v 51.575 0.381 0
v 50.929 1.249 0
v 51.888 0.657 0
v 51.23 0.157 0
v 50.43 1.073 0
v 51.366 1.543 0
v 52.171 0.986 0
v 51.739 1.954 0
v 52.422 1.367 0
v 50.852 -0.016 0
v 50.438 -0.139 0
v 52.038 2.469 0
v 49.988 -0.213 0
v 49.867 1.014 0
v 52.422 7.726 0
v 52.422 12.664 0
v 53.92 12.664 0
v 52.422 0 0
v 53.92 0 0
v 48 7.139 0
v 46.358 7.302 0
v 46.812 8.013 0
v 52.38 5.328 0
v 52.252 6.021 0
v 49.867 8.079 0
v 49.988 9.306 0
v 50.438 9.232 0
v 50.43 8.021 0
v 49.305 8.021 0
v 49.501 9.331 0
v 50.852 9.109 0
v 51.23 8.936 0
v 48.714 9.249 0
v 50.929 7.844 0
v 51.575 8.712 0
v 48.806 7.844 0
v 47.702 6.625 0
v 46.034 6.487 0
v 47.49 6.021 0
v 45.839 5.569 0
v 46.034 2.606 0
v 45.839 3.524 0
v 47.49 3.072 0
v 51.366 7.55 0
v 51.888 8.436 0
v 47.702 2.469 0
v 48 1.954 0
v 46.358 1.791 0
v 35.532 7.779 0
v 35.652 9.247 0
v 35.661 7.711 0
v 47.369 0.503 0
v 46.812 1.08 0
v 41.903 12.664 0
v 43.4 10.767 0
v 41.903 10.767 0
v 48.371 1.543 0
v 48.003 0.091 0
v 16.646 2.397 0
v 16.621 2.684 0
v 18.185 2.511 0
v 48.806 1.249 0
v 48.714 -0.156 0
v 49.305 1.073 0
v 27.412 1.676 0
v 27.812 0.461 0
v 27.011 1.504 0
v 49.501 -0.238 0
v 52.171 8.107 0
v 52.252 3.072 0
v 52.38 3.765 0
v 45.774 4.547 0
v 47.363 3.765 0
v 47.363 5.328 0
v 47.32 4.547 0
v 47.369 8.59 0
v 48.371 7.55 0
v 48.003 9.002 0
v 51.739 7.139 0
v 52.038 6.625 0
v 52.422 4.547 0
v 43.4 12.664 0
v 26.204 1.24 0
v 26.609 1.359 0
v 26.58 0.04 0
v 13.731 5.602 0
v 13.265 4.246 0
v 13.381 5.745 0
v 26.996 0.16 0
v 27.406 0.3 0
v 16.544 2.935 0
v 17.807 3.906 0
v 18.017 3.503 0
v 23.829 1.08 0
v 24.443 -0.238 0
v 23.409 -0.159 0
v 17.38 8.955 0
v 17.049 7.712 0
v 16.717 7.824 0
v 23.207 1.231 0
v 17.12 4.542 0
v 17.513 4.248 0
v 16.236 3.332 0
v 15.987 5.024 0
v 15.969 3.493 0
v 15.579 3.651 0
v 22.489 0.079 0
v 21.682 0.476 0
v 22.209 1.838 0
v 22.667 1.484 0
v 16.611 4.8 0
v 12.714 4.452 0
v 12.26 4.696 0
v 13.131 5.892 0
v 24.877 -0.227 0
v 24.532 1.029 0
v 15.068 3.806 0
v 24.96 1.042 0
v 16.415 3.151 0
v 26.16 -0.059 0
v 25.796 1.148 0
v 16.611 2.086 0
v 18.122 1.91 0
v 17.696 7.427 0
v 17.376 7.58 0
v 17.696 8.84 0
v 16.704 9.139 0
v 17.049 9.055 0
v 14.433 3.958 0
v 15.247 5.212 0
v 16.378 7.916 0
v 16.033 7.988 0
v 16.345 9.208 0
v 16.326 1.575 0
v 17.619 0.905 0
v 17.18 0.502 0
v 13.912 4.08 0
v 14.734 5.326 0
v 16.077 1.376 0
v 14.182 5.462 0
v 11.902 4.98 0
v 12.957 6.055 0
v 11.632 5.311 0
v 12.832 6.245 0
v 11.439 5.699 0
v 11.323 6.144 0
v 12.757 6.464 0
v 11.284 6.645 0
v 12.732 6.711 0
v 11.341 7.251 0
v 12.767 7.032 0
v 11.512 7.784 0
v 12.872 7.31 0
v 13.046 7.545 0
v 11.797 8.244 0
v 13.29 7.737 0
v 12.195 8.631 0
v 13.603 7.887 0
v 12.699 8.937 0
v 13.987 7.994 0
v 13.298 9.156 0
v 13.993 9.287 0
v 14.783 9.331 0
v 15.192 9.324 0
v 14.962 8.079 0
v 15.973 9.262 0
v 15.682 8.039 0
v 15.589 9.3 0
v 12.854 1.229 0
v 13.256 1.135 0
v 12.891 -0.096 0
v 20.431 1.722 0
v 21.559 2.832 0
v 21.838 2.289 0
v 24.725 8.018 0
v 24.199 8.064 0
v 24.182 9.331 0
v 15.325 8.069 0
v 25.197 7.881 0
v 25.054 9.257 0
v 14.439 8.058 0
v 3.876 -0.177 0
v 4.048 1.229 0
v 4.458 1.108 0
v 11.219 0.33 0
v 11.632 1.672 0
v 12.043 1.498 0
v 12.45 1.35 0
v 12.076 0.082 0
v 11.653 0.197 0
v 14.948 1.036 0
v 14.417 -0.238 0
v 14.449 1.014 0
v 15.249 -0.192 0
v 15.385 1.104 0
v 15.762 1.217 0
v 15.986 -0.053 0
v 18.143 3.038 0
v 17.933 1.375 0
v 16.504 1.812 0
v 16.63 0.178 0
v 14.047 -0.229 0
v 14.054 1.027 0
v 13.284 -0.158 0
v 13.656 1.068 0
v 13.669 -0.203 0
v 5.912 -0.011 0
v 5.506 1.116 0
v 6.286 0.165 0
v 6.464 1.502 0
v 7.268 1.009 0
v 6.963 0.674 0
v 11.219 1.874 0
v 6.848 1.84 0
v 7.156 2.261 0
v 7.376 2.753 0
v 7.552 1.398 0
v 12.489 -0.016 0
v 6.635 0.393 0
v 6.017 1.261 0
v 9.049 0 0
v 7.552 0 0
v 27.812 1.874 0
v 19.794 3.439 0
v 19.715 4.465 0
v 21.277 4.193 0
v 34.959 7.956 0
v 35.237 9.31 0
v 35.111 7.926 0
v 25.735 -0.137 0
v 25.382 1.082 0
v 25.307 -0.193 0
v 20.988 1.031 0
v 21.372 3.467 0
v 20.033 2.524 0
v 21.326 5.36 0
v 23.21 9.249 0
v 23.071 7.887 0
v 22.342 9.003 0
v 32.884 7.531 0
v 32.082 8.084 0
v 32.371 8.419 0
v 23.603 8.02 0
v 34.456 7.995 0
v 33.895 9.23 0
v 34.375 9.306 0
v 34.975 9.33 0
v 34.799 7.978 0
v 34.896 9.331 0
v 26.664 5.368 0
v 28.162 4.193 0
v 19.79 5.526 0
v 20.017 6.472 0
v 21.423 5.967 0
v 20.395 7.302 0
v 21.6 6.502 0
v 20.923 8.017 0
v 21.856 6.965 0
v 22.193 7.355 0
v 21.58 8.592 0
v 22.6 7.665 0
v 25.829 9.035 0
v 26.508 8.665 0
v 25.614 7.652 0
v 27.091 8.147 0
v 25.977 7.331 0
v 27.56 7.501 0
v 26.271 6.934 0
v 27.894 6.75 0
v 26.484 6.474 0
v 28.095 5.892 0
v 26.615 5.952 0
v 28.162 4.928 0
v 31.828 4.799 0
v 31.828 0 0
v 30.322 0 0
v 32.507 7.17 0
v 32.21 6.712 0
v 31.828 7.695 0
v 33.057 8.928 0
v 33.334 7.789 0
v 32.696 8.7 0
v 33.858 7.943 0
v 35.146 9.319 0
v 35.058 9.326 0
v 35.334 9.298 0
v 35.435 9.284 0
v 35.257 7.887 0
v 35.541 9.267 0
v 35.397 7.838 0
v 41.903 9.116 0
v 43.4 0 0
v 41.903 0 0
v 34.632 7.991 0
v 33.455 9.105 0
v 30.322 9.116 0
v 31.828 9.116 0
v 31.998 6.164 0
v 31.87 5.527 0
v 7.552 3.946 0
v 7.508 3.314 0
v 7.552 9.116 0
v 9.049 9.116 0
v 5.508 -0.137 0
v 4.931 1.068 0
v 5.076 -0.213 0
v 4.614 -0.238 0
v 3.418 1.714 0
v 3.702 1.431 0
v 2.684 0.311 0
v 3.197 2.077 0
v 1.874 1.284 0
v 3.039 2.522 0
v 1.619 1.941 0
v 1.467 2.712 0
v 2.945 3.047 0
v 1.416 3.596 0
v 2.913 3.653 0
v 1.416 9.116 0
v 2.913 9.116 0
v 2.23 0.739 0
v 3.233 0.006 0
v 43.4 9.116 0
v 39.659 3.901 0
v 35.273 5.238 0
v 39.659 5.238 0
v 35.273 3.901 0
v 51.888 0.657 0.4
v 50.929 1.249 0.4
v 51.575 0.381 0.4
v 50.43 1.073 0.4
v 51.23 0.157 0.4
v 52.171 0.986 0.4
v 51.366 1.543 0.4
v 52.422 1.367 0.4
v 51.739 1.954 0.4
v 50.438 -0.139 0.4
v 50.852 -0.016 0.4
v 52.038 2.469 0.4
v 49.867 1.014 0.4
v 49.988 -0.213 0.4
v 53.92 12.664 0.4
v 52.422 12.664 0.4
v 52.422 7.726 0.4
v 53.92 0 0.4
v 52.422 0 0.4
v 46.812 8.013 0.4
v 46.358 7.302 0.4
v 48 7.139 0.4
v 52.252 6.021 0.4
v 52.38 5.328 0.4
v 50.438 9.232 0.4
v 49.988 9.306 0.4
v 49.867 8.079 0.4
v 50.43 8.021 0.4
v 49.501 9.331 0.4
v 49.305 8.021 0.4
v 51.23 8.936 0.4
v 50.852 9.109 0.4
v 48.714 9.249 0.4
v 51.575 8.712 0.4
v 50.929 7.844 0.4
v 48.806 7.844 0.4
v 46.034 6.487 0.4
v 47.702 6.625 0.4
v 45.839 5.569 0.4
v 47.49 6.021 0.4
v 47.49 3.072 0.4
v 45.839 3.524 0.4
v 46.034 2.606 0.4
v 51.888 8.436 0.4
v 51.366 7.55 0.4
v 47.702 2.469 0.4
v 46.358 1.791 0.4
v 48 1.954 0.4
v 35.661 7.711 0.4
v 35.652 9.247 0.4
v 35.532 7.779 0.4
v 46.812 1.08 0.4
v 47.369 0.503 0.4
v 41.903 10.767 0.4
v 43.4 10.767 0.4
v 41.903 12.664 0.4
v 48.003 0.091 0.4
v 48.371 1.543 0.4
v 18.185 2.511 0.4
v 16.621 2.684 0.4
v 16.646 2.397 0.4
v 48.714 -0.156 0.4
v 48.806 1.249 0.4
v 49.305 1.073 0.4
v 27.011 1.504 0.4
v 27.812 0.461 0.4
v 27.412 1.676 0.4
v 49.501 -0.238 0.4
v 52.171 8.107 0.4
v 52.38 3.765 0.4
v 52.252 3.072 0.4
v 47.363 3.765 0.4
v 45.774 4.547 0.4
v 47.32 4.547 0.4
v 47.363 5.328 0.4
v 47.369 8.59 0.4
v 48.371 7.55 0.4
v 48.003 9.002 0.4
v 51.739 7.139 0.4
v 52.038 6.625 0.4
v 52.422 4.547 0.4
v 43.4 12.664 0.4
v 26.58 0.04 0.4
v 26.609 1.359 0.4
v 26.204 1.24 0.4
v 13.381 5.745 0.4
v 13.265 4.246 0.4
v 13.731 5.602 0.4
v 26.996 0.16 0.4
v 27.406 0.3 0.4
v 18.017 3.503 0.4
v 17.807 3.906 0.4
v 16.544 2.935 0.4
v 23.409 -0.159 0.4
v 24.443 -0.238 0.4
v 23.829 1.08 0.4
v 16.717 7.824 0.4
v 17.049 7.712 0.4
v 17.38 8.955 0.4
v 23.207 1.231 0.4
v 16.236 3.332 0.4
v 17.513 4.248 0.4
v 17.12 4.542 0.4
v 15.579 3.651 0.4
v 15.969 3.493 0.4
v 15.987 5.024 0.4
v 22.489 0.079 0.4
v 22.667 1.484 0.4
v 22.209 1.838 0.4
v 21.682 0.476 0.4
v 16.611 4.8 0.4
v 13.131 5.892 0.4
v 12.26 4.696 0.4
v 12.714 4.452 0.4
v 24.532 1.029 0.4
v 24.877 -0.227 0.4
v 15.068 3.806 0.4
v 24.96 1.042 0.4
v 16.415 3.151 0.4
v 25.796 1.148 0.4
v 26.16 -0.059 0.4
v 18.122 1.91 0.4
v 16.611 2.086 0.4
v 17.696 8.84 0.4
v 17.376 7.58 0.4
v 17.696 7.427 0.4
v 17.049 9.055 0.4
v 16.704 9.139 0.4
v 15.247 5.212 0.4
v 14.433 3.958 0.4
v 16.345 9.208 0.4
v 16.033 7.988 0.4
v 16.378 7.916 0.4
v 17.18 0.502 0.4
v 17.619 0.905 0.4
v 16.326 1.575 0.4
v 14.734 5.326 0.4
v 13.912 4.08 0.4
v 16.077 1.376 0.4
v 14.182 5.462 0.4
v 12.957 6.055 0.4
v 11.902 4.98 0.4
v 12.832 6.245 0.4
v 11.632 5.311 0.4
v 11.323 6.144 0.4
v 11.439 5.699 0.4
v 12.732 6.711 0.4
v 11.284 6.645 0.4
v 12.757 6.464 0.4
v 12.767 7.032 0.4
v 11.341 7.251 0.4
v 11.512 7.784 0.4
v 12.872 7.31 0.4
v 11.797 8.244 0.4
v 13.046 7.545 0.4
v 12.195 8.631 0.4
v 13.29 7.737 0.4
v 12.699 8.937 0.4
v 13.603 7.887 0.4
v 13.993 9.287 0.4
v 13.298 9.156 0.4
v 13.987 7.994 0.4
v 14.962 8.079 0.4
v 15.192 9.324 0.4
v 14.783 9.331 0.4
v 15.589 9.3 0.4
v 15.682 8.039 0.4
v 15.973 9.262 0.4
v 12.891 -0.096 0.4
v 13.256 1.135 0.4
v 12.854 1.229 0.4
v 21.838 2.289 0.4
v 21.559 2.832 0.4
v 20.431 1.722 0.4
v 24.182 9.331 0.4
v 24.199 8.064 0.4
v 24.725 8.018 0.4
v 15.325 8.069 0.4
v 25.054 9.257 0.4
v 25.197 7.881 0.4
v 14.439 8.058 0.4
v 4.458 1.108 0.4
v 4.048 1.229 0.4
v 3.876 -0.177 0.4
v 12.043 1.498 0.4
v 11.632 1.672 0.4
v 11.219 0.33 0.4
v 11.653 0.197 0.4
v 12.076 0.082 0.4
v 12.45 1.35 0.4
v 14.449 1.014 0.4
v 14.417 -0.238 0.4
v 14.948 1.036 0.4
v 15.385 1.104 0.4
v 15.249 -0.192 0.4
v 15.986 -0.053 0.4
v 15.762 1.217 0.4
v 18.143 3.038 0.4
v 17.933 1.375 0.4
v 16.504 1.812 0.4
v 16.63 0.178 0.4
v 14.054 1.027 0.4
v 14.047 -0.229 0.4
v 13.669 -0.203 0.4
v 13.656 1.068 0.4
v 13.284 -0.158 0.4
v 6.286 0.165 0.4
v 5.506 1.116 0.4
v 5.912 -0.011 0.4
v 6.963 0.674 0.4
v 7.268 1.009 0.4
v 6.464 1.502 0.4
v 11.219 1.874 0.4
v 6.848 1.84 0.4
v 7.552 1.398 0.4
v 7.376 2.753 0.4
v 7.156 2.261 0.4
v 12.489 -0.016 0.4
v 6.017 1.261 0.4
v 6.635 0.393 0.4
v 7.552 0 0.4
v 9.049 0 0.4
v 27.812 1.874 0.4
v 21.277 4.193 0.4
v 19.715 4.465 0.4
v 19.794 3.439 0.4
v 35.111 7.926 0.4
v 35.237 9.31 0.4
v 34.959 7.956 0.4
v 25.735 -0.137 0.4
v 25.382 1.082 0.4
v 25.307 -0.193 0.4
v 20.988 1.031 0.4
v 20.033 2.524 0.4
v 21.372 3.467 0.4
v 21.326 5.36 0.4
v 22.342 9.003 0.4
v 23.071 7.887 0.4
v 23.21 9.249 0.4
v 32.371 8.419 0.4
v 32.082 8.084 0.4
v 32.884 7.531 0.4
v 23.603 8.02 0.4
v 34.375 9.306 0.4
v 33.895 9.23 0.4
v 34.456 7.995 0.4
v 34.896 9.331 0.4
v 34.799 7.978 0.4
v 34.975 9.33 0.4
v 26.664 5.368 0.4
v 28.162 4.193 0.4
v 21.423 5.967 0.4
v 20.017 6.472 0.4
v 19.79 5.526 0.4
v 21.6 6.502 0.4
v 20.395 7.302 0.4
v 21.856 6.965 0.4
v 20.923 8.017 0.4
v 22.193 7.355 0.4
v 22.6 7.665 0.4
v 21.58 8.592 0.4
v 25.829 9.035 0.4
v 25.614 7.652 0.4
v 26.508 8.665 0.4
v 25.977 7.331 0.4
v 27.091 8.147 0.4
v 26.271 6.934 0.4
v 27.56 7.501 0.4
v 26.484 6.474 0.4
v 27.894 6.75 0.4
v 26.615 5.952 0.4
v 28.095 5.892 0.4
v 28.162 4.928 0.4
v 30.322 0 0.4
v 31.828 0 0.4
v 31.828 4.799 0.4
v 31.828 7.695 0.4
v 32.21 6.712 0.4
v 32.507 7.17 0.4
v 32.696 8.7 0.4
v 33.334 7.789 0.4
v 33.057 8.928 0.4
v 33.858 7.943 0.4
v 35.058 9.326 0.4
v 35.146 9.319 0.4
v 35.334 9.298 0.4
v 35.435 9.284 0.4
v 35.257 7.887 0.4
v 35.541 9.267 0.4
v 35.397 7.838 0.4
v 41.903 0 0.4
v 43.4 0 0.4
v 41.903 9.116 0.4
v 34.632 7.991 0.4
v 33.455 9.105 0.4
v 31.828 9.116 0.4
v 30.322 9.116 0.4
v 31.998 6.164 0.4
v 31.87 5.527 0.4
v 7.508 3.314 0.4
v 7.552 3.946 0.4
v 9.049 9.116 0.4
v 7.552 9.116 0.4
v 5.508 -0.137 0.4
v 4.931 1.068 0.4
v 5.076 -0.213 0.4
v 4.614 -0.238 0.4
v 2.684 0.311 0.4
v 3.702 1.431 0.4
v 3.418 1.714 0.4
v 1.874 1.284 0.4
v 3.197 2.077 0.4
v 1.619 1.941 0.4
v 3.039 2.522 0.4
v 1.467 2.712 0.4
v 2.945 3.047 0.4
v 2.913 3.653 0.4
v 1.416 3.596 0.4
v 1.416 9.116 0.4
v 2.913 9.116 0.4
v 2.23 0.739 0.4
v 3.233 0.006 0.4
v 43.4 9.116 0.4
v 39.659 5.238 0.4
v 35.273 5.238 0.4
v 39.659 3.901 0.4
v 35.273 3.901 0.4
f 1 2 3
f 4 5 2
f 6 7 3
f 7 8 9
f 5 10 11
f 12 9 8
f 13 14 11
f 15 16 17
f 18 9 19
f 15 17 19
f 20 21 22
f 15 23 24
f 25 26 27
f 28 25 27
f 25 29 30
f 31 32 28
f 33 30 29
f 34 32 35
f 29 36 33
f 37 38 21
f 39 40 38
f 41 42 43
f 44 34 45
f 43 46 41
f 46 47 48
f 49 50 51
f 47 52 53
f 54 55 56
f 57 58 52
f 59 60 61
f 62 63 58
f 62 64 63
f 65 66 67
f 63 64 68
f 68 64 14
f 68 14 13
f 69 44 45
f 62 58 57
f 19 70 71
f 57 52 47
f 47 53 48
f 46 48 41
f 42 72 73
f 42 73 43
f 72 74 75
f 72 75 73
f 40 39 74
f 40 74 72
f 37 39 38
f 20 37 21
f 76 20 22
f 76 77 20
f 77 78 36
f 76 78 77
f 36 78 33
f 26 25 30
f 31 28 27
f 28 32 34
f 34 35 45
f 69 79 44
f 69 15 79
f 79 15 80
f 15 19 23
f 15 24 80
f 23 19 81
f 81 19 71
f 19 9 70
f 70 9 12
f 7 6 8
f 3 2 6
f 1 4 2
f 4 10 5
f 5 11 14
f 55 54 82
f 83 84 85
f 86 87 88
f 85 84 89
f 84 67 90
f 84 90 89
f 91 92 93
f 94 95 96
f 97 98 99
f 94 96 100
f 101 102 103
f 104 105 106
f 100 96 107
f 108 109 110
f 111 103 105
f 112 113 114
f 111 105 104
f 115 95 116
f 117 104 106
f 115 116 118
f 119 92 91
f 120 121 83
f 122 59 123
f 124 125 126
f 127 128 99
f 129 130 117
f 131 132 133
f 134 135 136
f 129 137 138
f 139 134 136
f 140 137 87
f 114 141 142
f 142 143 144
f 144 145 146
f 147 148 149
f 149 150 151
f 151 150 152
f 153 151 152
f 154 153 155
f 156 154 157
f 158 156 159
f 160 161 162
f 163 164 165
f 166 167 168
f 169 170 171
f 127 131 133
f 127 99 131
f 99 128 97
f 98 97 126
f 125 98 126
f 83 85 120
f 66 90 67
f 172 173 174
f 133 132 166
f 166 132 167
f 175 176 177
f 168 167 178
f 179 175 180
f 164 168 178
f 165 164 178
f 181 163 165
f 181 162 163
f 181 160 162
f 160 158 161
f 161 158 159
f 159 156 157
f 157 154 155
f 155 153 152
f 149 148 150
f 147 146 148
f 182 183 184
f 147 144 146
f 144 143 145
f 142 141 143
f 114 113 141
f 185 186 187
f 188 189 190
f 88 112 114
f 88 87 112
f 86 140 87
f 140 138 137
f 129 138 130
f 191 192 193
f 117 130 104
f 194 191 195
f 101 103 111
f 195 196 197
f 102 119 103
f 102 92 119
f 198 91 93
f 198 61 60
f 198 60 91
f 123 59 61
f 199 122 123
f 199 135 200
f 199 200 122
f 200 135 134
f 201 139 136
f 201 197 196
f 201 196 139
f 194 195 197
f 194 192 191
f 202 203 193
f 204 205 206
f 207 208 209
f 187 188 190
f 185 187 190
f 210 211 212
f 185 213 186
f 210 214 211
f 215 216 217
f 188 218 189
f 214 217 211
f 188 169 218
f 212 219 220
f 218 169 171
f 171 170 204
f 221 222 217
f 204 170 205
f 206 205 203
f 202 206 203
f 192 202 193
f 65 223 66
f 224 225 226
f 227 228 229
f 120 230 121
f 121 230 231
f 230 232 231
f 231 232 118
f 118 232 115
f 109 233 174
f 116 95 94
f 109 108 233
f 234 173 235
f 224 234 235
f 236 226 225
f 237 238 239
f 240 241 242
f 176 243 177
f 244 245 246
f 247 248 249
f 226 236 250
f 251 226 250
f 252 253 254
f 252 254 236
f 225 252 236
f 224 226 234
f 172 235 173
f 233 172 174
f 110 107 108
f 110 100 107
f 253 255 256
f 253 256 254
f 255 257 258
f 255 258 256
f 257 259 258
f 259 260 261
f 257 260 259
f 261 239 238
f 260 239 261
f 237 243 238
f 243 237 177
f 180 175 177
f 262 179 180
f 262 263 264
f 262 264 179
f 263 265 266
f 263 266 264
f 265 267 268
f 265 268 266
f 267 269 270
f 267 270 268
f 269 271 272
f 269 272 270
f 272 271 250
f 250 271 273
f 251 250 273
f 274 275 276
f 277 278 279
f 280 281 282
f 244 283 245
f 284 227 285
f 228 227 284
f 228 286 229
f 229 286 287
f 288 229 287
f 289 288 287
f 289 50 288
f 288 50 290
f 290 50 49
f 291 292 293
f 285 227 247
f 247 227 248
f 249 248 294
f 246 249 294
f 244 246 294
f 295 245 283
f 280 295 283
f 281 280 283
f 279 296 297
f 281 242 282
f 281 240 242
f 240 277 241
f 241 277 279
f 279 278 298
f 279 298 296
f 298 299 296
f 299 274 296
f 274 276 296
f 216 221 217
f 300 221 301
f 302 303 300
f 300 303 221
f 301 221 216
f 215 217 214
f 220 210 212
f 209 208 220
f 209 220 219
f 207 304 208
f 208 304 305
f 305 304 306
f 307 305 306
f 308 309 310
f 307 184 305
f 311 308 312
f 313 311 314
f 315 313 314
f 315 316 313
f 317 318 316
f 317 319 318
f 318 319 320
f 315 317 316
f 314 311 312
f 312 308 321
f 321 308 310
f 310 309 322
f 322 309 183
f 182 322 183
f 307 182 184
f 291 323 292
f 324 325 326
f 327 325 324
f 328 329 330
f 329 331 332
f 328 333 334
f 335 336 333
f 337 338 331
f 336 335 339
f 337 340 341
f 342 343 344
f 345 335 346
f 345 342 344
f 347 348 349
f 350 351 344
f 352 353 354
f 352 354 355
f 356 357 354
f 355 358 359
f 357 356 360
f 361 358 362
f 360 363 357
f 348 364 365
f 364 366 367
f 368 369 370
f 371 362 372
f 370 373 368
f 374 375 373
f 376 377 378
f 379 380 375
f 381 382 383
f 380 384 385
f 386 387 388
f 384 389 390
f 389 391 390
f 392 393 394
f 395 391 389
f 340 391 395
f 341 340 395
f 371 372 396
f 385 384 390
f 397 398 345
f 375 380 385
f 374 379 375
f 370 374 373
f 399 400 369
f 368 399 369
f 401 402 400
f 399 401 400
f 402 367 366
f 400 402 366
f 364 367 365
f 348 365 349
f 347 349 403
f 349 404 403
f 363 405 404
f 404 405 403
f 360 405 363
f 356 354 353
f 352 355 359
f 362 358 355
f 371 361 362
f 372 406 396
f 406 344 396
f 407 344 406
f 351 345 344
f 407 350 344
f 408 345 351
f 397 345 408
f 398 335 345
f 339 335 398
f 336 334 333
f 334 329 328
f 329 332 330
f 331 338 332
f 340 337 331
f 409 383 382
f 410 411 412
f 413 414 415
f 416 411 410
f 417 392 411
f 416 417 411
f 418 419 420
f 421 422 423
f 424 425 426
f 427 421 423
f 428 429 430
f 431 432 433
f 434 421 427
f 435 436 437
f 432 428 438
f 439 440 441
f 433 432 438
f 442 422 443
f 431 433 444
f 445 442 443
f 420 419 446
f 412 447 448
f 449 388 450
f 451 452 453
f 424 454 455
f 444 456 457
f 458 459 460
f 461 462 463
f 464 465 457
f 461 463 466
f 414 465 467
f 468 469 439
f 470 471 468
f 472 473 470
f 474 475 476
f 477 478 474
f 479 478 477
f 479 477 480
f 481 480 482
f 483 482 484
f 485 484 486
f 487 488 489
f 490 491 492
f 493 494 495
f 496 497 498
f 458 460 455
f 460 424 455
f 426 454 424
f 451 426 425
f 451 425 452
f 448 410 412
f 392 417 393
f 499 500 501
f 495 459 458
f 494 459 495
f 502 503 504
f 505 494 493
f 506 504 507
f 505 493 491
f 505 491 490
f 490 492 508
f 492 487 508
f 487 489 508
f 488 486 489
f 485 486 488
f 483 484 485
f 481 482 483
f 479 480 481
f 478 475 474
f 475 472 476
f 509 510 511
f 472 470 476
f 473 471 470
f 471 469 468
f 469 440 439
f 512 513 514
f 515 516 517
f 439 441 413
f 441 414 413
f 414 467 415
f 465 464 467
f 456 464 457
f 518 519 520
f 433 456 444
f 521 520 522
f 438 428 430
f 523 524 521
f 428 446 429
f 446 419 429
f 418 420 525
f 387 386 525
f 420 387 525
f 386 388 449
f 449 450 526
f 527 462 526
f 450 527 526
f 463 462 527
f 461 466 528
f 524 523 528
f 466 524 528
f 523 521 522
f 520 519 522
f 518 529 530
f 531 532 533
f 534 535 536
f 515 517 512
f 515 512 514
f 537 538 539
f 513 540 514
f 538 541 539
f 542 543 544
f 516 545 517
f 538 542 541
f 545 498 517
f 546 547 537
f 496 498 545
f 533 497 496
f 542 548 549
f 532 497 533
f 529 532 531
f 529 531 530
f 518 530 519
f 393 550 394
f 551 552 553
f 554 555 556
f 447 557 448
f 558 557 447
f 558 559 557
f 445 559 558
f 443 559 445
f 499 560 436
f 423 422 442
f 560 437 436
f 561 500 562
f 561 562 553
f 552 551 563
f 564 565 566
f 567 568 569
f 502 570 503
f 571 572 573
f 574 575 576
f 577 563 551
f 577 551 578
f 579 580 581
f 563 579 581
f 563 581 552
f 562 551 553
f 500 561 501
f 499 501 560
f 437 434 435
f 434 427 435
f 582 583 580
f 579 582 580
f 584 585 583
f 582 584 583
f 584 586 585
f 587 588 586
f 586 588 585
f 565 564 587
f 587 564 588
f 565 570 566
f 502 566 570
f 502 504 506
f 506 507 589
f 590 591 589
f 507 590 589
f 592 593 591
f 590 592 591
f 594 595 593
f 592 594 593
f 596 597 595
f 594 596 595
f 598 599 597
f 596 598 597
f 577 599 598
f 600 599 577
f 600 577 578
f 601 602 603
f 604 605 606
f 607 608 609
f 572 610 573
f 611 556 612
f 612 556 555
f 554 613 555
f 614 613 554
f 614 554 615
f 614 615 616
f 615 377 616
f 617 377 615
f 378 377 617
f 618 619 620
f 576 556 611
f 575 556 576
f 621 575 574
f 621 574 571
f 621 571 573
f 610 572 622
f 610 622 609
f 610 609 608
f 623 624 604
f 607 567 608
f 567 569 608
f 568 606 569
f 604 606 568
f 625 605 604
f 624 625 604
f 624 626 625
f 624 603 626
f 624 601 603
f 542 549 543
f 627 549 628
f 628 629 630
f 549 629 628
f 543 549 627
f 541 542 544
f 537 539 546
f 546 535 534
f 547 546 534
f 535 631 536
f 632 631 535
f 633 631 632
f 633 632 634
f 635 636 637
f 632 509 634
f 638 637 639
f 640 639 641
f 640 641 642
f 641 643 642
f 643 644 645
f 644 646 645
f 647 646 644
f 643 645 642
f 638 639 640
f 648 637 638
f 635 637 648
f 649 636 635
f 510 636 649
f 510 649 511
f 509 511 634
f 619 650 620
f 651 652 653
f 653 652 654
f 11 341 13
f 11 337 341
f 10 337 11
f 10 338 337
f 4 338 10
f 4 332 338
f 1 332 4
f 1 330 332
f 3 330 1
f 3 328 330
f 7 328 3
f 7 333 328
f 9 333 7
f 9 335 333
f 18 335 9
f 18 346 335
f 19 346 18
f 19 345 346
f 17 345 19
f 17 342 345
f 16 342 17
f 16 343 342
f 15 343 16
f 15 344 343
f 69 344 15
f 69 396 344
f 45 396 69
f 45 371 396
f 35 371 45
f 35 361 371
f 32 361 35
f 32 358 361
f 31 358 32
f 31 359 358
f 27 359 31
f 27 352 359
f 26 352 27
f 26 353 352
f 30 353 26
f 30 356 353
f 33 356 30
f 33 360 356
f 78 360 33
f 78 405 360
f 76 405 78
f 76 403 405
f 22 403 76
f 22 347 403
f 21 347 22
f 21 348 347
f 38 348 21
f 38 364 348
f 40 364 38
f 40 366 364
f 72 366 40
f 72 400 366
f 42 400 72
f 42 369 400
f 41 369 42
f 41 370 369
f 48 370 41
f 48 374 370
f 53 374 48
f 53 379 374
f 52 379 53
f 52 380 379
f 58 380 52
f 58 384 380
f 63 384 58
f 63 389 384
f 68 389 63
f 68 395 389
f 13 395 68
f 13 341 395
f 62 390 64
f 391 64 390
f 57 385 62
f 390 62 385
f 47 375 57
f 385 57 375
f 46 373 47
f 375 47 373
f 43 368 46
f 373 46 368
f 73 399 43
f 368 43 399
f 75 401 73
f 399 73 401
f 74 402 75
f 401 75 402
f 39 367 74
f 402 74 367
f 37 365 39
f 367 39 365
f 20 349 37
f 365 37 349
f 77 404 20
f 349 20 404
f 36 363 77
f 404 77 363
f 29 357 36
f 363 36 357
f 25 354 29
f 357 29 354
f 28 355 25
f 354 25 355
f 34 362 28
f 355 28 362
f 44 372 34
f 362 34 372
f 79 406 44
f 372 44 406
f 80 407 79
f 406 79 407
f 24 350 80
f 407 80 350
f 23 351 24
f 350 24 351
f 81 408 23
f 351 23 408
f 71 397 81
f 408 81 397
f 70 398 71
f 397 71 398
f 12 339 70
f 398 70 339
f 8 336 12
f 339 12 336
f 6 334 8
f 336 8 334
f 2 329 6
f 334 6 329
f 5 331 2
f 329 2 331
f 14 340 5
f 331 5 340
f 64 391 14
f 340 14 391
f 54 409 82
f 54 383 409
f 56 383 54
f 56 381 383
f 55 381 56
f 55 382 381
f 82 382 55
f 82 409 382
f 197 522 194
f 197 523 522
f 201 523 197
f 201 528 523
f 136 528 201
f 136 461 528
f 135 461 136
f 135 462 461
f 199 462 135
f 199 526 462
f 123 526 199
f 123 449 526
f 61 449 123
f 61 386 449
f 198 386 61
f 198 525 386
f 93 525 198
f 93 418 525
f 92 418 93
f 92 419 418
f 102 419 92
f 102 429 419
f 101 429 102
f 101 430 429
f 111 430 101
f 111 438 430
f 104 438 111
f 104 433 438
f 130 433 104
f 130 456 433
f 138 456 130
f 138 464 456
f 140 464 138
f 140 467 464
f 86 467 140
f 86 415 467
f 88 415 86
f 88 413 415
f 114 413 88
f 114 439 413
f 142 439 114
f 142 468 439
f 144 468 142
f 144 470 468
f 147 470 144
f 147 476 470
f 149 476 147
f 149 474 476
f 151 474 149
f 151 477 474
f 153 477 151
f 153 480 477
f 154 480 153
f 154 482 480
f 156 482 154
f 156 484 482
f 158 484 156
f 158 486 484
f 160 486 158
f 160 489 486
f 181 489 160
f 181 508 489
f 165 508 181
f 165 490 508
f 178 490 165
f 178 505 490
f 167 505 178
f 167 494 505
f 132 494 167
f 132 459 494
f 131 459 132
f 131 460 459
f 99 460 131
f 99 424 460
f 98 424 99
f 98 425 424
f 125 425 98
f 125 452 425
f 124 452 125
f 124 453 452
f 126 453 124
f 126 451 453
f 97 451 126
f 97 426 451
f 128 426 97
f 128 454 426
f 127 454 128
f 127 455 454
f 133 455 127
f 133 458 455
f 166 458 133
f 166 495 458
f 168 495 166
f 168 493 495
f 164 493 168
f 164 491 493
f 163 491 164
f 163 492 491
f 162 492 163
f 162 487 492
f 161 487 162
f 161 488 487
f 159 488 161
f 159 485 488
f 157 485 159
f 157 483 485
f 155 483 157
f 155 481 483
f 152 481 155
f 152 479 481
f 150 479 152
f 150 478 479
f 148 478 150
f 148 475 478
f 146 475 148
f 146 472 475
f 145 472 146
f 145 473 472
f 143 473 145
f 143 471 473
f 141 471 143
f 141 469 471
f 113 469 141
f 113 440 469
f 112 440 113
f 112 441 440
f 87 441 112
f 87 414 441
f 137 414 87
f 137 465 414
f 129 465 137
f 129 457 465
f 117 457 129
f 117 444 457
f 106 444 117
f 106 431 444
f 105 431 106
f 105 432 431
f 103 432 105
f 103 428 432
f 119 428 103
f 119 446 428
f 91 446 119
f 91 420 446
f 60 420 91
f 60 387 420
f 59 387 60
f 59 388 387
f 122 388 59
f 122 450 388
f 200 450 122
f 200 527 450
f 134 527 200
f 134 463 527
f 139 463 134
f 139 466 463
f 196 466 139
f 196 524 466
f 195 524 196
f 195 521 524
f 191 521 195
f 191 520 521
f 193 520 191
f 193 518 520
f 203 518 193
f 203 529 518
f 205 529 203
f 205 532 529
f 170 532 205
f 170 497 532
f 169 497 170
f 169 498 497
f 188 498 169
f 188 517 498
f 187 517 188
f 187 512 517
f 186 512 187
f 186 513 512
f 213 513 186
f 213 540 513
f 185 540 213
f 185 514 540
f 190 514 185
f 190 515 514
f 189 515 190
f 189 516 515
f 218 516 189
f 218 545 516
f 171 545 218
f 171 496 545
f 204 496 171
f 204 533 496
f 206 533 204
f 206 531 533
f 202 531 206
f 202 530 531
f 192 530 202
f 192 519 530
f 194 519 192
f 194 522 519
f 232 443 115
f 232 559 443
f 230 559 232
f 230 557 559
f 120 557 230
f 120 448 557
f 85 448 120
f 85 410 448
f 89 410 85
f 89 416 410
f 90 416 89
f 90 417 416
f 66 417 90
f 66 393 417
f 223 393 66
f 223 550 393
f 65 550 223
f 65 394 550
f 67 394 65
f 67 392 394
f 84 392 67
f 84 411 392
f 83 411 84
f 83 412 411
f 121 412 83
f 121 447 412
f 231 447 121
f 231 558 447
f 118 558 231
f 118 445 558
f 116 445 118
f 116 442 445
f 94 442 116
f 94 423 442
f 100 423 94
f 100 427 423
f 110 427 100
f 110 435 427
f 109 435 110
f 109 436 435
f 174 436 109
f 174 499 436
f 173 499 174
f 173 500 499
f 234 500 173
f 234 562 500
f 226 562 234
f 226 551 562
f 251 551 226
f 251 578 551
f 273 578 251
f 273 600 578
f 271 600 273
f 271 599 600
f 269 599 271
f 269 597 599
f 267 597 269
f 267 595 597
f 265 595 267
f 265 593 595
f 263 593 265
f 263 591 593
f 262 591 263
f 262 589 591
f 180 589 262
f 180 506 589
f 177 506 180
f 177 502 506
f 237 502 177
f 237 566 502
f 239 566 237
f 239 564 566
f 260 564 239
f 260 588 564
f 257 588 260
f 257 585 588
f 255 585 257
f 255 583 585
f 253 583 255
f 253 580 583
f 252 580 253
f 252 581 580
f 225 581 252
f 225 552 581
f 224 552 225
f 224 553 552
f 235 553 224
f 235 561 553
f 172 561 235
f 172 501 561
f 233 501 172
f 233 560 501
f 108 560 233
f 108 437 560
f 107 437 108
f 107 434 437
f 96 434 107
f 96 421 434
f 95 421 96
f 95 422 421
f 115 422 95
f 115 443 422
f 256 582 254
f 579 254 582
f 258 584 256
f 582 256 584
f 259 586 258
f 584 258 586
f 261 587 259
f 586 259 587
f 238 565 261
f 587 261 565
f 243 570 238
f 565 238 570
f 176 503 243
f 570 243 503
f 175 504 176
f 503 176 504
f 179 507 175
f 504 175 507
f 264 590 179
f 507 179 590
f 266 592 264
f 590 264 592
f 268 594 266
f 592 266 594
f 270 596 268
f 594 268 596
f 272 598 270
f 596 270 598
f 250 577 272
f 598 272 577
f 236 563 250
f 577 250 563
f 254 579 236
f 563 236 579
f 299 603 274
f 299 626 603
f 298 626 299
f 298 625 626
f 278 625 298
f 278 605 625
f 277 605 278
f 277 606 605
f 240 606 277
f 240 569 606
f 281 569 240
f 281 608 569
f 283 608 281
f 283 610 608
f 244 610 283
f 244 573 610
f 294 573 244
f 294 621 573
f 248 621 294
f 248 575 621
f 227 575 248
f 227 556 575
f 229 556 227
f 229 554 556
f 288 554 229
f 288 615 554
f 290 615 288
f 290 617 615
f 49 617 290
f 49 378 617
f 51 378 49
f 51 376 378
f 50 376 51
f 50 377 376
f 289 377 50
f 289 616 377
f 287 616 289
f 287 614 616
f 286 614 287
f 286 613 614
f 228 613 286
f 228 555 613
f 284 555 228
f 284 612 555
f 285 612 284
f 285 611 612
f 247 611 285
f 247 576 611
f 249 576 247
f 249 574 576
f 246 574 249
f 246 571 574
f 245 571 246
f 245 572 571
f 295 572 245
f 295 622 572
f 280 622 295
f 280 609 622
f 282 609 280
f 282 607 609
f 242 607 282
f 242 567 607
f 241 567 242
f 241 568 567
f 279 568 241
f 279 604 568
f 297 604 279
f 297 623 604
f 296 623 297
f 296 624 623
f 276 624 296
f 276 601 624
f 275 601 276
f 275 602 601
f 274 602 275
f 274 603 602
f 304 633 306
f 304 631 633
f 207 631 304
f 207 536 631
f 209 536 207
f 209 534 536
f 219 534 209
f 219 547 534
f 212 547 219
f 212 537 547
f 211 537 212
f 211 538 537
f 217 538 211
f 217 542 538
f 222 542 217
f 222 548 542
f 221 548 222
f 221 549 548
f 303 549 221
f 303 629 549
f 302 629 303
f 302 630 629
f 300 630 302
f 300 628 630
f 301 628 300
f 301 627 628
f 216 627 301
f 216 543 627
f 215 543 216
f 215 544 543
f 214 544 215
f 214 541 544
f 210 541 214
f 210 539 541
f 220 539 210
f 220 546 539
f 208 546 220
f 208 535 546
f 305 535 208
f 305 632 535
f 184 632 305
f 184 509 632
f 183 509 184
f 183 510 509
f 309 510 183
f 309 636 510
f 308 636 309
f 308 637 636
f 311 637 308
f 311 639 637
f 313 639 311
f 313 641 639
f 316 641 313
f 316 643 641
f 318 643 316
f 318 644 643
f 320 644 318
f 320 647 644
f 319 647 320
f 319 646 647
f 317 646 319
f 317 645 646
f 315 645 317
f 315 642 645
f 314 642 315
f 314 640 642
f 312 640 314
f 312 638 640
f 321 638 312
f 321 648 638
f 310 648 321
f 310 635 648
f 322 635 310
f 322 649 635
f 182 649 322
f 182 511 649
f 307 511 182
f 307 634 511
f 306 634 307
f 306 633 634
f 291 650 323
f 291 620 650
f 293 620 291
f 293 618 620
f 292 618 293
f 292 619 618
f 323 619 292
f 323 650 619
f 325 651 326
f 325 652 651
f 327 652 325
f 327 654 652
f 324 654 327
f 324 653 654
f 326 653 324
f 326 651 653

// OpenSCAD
t="user-id";
h=0.4;

linear_extrude(height=h) {
    text(text=t, font="Linux Libertine O", size=12);
}
